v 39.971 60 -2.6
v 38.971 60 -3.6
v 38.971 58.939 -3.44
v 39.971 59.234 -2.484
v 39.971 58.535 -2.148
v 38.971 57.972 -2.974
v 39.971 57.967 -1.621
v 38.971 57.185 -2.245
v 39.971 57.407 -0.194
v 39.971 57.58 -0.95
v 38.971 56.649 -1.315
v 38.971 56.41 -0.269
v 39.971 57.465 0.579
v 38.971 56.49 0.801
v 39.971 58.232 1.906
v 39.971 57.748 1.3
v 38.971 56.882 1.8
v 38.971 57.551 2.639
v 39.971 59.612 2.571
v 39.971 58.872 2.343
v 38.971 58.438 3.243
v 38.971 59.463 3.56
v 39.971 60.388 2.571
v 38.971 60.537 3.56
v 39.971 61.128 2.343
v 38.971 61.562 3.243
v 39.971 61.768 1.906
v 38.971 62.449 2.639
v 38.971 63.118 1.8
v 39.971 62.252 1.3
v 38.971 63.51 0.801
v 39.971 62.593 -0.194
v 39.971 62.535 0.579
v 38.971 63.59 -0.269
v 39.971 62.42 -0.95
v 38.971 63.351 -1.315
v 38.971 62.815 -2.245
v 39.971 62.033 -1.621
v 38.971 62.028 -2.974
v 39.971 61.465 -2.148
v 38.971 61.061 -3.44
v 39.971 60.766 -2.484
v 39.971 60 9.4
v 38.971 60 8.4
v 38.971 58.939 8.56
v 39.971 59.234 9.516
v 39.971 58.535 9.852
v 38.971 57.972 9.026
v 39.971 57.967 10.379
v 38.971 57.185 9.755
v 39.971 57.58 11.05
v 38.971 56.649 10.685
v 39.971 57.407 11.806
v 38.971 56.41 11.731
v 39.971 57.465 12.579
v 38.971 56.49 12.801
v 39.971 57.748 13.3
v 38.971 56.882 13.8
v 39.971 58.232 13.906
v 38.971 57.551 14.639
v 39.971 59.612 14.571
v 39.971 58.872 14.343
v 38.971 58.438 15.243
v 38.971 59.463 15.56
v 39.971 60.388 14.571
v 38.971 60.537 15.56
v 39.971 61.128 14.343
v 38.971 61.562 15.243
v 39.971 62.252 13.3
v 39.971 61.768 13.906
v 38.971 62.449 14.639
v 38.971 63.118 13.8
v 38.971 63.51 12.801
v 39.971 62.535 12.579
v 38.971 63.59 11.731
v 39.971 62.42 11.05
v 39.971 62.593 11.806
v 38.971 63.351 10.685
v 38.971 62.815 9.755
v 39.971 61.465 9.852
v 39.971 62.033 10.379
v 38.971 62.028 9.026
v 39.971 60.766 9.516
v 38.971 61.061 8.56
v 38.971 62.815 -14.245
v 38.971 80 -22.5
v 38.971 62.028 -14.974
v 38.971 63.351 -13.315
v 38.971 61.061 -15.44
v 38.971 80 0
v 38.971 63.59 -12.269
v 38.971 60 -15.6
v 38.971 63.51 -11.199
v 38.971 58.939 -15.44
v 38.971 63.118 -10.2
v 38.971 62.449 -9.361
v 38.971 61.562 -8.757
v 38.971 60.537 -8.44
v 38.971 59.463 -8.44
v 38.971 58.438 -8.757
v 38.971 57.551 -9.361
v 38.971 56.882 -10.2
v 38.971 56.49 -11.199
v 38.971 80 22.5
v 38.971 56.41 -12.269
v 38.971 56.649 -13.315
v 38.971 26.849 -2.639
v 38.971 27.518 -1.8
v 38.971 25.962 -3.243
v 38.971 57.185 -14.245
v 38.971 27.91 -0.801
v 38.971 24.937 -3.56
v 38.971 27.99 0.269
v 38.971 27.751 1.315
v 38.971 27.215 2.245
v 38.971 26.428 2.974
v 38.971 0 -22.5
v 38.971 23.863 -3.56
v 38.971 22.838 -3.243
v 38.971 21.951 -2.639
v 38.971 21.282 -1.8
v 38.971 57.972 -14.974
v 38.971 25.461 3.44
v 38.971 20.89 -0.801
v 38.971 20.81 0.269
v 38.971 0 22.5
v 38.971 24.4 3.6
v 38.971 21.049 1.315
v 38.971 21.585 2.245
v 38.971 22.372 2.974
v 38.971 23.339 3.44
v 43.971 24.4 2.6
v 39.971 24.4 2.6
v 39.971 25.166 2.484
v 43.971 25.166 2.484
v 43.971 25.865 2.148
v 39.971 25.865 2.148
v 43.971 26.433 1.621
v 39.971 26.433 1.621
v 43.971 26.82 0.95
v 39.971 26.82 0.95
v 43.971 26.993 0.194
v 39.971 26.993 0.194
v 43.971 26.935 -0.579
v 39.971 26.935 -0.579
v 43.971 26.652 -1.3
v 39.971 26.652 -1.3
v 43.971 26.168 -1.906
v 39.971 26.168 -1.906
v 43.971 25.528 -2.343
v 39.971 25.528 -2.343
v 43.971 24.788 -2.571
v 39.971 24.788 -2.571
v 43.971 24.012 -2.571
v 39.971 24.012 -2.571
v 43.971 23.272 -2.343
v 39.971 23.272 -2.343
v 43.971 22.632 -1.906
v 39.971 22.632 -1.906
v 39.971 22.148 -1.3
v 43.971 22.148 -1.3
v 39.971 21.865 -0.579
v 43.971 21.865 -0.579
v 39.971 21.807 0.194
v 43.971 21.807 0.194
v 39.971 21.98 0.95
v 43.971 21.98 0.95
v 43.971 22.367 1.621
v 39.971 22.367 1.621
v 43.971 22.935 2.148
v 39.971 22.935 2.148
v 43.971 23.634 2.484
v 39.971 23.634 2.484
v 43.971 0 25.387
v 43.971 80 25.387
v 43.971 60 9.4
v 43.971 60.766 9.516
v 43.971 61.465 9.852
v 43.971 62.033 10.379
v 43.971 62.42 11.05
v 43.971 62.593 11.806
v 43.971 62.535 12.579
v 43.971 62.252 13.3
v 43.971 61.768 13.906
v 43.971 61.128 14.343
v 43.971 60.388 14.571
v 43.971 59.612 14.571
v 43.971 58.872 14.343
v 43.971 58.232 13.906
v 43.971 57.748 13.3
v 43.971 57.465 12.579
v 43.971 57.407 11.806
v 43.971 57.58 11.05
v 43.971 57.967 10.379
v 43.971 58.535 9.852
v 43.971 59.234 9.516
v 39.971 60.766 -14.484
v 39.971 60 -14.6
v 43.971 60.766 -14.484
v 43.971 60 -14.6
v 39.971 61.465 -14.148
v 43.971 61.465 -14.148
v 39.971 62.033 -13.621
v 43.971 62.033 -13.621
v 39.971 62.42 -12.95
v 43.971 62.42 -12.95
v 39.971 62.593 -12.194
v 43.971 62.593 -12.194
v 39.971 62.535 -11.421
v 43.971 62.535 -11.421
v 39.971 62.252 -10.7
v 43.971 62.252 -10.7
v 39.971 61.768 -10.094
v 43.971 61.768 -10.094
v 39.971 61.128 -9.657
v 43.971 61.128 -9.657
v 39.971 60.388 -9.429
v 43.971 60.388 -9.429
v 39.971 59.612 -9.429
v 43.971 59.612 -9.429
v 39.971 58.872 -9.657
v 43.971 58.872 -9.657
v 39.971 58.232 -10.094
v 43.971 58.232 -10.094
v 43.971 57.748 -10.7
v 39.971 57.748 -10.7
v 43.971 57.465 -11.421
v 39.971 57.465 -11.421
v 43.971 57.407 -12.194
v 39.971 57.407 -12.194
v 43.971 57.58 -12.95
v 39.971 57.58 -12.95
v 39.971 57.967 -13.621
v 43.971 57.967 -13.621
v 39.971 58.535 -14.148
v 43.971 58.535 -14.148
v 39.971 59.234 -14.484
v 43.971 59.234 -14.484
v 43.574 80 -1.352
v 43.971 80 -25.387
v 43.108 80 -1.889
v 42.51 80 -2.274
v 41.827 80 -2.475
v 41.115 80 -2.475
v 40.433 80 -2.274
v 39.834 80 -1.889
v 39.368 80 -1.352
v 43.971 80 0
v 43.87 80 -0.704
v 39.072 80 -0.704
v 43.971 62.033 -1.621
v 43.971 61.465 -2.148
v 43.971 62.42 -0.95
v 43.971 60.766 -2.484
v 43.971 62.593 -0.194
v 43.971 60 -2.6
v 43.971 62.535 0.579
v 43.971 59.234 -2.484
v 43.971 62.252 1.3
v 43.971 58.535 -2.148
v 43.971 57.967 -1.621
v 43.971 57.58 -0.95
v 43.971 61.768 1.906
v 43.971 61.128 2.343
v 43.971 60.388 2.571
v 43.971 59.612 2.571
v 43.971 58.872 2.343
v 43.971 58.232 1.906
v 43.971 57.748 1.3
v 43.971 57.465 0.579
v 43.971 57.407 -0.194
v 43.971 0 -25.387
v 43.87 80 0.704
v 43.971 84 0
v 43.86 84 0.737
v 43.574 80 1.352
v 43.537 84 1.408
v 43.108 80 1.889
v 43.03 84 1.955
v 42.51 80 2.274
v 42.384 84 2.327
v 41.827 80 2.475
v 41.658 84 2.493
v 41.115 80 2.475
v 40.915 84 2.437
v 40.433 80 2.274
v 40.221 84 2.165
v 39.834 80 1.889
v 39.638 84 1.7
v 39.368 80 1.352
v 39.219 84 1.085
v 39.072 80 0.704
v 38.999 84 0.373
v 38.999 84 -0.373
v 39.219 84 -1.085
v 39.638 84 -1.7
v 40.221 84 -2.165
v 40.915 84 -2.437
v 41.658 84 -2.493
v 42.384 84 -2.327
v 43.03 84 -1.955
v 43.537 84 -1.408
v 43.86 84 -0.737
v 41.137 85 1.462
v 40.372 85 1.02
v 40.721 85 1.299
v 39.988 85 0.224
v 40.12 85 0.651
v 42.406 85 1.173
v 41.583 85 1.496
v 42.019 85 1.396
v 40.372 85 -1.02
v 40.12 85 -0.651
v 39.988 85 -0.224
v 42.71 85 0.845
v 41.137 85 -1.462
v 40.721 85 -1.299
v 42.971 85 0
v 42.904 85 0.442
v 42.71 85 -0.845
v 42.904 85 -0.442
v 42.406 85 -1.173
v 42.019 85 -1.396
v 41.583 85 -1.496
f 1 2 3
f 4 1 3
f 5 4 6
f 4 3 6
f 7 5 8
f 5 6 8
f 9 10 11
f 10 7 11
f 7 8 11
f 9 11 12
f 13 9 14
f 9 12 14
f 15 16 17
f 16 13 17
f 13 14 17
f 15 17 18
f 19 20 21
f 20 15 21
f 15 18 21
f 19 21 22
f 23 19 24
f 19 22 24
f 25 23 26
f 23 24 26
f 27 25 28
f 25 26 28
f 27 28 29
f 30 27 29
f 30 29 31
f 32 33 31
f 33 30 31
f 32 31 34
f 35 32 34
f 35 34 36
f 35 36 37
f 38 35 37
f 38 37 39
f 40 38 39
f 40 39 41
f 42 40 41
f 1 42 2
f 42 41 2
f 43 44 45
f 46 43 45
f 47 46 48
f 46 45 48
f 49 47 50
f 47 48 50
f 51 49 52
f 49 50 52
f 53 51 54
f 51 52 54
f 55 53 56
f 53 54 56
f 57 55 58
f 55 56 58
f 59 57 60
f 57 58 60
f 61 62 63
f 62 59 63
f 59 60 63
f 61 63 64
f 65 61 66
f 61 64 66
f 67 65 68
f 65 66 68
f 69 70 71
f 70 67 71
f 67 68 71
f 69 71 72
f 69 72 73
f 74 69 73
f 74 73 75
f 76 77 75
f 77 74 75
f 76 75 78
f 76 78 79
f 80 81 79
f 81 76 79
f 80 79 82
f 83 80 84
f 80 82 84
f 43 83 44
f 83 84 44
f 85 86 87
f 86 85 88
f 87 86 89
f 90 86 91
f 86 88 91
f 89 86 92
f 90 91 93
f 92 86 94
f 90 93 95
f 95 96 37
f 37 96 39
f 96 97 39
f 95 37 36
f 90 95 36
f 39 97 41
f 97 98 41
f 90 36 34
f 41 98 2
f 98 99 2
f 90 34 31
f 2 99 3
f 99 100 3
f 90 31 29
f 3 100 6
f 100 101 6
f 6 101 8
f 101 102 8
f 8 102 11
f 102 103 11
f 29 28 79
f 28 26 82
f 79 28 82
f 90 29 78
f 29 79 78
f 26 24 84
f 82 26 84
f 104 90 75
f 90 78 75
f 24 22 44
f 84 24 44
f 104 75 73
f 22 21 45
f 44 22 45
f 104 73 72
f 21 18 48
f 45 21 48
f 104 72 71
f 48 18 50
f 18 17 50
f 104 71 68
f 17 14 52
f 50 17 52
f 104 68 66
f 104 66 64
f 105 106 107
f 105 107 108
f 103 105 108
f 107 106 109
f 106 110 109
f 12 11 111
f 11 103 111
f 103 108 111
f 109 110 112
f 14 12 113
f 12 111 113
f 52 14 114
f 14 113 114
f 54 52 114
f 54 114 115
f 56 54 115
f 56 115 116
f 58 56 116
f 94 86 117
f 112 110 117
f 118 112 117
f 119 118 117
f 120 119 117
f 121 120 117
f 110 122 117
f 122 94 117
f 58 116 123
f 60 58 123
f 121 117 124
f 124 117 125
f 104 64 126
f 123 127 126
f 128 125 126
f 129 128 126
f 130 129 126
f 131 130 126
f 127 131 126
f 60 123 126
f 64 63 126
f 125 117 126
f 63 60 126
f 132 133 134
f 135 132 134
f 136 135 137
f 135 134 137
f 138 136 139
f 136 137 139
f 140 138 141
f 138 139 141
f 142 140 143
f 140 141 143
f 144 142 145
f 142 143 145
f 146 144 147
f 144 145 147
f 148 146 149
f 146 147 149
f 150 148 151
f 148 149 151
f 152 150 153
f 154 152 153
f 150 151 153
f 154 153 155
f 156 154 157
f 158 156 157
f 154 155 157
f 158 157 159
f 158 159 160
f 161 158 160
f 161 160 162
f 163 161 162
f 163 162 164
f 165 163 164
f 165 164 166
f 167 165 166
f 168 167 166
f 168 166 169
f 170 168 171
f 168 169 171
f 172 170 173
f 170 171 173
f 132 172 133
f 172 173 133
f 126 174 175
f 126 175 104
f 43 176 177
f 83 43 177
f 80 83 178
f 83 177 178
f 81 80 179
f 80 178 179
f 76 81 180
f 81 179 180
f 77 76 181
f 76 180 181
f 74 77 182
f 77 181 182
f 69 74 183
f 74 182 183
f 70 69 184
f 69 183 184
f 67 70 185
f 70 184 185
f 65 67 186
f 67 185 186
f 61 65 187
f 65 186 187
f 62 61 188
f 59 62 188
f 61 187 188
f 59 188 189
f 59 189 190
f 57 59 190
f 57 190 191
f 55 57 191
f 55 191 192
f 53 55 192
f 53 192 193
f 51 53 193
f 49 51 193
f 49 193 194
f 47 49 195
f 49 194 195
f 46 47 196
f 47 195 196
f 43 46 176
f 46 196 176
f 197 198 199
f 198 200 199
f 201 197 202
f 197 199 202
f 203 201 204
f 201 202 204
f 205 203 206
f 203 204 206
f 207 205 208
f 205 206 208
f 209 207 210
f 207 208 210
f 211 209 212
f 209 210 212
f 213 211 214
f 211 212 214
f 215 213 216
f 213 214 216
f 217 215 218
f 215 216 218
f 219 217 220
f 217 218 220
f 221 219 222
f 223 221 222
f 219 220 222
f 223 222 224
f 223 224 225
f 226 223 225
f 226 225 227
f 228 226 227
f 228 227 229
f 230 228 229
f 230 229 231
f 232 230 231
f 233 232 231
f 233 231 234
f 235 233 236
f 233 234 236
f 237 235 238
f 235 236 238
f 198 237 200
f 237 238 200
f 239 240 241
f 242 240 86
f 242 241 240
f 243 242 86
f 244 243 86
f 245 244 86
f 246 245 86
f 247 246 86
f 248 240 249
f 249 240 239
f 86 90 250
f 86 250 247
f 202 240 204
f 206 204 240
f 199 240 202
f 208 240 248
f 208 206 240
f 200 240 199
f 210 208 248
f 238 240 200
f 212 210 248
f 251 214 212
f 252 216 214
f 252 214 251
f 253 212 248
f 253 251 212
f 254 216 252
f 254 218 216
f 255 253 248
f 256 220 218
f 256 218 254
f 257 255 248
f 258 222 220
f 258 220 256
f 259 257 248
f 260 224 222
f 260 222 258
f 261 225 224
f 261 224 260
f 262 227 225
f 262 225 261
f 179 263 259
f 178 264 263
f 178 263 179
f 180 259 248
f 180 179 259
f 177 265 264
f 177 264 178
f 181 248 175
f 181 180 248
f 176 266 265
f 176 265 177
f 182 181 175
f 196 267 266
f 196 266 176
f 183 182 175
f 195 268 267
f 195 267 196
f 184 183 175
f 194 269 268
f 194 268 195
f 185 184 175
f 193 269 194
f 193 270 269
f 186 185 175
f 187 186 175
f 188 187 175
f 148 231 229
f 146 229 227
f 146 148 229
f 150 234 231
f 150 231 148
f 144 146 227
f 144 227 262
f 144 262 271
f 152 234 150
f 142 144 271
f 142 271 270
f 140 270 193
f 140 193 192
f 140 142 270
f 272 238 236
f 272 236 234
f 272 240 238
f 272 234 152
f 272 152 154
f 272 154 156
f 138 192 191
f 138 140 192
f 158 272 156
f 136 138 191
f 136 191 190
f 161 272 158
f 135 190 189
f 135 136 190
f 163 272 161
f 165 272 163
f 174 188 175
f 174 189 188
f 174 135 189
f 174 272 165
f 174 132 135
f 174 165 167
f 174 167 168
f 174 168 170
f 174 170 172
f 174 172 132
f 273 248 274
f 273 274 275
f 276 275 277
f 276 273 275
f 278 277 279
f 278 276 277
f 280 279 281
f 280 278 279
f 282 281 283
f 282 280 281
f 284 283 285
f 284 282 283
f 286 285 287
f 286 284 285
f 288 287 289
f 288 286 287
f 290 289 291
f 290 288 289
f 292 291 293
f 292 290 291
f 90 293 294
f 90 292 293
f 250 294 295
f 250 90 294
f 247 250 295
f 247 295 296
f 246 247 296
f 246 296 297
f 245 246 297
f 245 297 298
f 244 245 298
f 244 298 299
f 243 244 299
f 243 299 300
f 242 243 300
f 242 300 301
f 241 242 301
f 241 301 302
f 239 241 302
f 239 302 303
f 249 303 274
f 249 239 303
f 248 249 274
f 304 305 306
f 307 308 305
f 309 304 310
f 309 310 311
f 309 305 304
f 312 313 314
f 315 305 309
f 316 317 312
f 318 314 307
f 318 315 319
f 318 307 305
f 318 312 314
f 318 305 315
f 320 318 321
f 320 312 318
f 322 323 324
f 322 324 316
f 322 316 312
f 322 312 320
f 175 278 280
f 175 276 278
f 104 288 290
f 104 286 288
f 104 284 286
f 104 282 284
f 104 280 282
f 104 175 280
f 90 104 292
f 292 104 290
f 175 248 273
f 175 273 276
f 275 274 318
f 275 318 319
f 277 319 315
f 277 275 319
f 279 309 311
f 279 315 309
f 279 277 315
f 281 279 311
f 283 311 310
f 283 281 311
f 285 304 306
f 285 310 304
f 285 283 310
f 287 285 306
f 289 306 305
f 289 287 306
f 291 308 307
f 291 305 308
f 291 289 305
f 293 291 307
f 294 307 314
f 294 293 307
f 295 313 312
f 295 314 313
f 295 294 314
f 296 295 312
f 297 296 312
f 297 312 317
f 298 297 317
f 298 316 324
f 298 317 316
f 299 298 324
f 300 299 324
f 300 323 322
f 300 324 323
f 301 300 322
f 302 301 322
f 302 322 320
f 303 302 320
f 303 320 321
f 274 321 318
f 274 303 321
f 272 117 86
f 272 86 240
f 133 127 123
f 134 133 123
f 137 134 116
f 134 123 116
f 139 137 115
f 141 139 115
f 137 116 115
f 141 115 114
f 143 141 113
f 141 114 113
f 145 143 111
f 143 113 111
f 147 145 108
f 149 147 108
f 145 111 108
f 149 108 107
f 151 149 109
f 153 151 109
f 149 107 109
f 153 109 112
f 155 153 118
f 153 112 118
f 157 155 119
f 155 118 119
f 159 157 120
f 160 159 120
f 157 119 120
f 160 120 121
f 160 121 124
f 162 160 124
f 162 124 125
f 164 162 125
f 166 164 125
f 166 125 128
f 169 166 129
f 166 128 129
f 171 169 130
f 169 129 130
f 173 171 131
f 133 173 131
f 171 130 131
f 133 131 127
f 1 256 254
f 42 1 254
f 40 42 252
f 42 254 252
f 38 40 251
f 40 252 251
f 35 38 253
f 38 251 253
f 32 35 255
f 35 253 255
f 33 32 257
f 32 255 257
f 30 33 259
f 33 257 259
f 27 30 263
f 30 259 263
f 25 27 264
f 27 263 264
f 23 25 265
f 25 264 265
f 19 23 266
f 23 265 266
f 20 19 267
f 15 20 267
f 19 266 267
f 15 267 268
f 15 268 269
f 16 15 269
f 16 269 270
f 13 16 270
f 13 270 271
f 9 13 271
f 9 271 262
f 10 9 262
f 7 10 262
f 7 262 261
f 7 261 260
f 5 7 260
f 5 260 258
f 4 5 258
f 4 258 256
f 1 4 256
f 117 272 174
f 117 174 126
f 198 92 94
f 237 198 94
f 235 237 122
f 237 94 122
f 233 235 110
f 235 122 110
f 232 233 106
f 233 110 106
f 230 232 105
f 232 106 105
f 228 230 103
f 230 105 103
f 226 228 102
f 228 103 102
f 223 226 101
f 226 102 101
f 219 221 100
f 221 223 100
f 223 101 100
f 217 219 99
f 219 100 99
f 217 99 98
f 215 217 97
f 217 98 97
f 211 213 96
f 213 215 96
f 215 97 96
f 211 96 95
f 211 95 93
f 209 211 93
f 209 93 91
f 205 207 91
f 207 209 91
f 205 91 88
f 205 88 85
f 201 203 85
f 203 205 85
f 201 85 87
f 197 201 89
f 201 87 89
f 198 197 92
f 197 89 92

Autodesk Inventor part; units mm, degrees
ref_plane "YZ Plane" through (0, 0, 0) normal (1, 0, 0) x (0, 1, 0)
ref_plane "XZ Plane" through (0, 0, 0) normal (0, 1, 0) x (-1, 0, 0)
ref_plane "XY Plane" through (0, 0, 0) normal (0, 0, 1) x (1, 0, 0)
sketch "스케치2" plane through (0, 0, 0) normal (0, 1, 0) x (-1, 0, 0)
  line L0 (0, 45) -> (38.9711, 22.5)
  line L1 (38.9711, 22.5) -> (38.9711, -22.5)
  line L2 (38.9711, -22.5) -> (0, -45)
  line L3 (0, -45) -> (-38.9711, -22.5)
  line L4 (-38.9711, -22.5) -> (-38.9711, 22.5)
  line L5 (-38.9711, 22.5) -> (0, 45)
  line L6 (0, 50.7735) -> (43.9711, 25.3868)
  line L7 (43.9711, 25.3868) -> (43.9711, -25.3868)
  line L8 (43.9711, -25.3868) -> (0, -50.7735)
  line L9 (0, -50.7735) -> (-43.9711, -25.3868)
  line L10 (-43.9711, -25.3868) -> (-43.9711, 25.3868)
  line L11 (-43.9711, 25.3868) -> (0, 50.7735)
  line L12 (-43.9711, 25.3868) -> (-38.9711, 22.5)
  line L13 (-38.9711, -22.5) -> (-43.9711, -25.3868)
  point P0 (0, 0)
  point P1 (0, 0)
  dimension "d0" = 45
  dimension "d1" = 5
extrude "돌출1" add sketch "스케치2" along normal blind 80 contours L4 L13 L10 L12
sketch "스케치3" plane through (38.9711, 0, -22.5) normal (-1, 0, 0) x (0, 0, 1)
  line L0 (0, 0) -> (45, 0) construction
  circle A0 centre (22.5, 24.4) radius 2.6
  point P0 (22.5, 0)
  point P1 (22.5, 0)
  dimension "d4" = 5.2
  dimension "d5" = 24.4
extrude "돌출2" cut sketch "스케치3" against normal through all
sketch "스케치4" plane through (0, 80, 0) normal (0, 1, 0) x (1, 0, 0)
  line L0 (38.9711, 22.5) -> (38.9711, -22.5) construction
  circle A0 centre (41.4711, 0) radius 2.5
  point P0 (0, 0)
  dimension "d8" = 5
extrude "돌출3" add sketch "스케치4" along normal blind 5
sketch "스케치5" plane through (43.9711, 0, 25.3868) normal (1, 0, 0) x (0, 0, -1)
  line L0 (50.7735, 0) -> (50.7735, 80) construction
  line L1 (25.3868, 80) -> (50.7735, 80) construction
  line L2 (0, 0) -> (0, 80) construction
  circle A0 centre (25.3868, 60) radius 2.6
  circle A1 centre (13.3868, 60) radius 2.6
  circle A2 centre (37.3868, 60) radius 2.6
  line L3 (0, 60) -> (50.7735, 60)
  point P0 (25.3868, 0)
  dimension "d11" = 20
  dimension "d12" = 0
  dimension "d13" = 0
  dimension "d14" = 0
  dimension "d15" = 12
  dimension "d16" = 12
  dimension "d17" = 5.2
  dimension "d18" = 5.2
  dimension "d19" = 5.2
extrude "돌출4" cut sketch "스케치5" against normal through all
chamfer "모따기1" distance 1 angle 45 5 edges at (38.9711, 85, 0) (38.9711, 60, -9.4) (38.9711, 60, 2.6) (38.9711, 60, 14.6) (38.9711, 24.4, -2.6)
properties part number "col_face"
